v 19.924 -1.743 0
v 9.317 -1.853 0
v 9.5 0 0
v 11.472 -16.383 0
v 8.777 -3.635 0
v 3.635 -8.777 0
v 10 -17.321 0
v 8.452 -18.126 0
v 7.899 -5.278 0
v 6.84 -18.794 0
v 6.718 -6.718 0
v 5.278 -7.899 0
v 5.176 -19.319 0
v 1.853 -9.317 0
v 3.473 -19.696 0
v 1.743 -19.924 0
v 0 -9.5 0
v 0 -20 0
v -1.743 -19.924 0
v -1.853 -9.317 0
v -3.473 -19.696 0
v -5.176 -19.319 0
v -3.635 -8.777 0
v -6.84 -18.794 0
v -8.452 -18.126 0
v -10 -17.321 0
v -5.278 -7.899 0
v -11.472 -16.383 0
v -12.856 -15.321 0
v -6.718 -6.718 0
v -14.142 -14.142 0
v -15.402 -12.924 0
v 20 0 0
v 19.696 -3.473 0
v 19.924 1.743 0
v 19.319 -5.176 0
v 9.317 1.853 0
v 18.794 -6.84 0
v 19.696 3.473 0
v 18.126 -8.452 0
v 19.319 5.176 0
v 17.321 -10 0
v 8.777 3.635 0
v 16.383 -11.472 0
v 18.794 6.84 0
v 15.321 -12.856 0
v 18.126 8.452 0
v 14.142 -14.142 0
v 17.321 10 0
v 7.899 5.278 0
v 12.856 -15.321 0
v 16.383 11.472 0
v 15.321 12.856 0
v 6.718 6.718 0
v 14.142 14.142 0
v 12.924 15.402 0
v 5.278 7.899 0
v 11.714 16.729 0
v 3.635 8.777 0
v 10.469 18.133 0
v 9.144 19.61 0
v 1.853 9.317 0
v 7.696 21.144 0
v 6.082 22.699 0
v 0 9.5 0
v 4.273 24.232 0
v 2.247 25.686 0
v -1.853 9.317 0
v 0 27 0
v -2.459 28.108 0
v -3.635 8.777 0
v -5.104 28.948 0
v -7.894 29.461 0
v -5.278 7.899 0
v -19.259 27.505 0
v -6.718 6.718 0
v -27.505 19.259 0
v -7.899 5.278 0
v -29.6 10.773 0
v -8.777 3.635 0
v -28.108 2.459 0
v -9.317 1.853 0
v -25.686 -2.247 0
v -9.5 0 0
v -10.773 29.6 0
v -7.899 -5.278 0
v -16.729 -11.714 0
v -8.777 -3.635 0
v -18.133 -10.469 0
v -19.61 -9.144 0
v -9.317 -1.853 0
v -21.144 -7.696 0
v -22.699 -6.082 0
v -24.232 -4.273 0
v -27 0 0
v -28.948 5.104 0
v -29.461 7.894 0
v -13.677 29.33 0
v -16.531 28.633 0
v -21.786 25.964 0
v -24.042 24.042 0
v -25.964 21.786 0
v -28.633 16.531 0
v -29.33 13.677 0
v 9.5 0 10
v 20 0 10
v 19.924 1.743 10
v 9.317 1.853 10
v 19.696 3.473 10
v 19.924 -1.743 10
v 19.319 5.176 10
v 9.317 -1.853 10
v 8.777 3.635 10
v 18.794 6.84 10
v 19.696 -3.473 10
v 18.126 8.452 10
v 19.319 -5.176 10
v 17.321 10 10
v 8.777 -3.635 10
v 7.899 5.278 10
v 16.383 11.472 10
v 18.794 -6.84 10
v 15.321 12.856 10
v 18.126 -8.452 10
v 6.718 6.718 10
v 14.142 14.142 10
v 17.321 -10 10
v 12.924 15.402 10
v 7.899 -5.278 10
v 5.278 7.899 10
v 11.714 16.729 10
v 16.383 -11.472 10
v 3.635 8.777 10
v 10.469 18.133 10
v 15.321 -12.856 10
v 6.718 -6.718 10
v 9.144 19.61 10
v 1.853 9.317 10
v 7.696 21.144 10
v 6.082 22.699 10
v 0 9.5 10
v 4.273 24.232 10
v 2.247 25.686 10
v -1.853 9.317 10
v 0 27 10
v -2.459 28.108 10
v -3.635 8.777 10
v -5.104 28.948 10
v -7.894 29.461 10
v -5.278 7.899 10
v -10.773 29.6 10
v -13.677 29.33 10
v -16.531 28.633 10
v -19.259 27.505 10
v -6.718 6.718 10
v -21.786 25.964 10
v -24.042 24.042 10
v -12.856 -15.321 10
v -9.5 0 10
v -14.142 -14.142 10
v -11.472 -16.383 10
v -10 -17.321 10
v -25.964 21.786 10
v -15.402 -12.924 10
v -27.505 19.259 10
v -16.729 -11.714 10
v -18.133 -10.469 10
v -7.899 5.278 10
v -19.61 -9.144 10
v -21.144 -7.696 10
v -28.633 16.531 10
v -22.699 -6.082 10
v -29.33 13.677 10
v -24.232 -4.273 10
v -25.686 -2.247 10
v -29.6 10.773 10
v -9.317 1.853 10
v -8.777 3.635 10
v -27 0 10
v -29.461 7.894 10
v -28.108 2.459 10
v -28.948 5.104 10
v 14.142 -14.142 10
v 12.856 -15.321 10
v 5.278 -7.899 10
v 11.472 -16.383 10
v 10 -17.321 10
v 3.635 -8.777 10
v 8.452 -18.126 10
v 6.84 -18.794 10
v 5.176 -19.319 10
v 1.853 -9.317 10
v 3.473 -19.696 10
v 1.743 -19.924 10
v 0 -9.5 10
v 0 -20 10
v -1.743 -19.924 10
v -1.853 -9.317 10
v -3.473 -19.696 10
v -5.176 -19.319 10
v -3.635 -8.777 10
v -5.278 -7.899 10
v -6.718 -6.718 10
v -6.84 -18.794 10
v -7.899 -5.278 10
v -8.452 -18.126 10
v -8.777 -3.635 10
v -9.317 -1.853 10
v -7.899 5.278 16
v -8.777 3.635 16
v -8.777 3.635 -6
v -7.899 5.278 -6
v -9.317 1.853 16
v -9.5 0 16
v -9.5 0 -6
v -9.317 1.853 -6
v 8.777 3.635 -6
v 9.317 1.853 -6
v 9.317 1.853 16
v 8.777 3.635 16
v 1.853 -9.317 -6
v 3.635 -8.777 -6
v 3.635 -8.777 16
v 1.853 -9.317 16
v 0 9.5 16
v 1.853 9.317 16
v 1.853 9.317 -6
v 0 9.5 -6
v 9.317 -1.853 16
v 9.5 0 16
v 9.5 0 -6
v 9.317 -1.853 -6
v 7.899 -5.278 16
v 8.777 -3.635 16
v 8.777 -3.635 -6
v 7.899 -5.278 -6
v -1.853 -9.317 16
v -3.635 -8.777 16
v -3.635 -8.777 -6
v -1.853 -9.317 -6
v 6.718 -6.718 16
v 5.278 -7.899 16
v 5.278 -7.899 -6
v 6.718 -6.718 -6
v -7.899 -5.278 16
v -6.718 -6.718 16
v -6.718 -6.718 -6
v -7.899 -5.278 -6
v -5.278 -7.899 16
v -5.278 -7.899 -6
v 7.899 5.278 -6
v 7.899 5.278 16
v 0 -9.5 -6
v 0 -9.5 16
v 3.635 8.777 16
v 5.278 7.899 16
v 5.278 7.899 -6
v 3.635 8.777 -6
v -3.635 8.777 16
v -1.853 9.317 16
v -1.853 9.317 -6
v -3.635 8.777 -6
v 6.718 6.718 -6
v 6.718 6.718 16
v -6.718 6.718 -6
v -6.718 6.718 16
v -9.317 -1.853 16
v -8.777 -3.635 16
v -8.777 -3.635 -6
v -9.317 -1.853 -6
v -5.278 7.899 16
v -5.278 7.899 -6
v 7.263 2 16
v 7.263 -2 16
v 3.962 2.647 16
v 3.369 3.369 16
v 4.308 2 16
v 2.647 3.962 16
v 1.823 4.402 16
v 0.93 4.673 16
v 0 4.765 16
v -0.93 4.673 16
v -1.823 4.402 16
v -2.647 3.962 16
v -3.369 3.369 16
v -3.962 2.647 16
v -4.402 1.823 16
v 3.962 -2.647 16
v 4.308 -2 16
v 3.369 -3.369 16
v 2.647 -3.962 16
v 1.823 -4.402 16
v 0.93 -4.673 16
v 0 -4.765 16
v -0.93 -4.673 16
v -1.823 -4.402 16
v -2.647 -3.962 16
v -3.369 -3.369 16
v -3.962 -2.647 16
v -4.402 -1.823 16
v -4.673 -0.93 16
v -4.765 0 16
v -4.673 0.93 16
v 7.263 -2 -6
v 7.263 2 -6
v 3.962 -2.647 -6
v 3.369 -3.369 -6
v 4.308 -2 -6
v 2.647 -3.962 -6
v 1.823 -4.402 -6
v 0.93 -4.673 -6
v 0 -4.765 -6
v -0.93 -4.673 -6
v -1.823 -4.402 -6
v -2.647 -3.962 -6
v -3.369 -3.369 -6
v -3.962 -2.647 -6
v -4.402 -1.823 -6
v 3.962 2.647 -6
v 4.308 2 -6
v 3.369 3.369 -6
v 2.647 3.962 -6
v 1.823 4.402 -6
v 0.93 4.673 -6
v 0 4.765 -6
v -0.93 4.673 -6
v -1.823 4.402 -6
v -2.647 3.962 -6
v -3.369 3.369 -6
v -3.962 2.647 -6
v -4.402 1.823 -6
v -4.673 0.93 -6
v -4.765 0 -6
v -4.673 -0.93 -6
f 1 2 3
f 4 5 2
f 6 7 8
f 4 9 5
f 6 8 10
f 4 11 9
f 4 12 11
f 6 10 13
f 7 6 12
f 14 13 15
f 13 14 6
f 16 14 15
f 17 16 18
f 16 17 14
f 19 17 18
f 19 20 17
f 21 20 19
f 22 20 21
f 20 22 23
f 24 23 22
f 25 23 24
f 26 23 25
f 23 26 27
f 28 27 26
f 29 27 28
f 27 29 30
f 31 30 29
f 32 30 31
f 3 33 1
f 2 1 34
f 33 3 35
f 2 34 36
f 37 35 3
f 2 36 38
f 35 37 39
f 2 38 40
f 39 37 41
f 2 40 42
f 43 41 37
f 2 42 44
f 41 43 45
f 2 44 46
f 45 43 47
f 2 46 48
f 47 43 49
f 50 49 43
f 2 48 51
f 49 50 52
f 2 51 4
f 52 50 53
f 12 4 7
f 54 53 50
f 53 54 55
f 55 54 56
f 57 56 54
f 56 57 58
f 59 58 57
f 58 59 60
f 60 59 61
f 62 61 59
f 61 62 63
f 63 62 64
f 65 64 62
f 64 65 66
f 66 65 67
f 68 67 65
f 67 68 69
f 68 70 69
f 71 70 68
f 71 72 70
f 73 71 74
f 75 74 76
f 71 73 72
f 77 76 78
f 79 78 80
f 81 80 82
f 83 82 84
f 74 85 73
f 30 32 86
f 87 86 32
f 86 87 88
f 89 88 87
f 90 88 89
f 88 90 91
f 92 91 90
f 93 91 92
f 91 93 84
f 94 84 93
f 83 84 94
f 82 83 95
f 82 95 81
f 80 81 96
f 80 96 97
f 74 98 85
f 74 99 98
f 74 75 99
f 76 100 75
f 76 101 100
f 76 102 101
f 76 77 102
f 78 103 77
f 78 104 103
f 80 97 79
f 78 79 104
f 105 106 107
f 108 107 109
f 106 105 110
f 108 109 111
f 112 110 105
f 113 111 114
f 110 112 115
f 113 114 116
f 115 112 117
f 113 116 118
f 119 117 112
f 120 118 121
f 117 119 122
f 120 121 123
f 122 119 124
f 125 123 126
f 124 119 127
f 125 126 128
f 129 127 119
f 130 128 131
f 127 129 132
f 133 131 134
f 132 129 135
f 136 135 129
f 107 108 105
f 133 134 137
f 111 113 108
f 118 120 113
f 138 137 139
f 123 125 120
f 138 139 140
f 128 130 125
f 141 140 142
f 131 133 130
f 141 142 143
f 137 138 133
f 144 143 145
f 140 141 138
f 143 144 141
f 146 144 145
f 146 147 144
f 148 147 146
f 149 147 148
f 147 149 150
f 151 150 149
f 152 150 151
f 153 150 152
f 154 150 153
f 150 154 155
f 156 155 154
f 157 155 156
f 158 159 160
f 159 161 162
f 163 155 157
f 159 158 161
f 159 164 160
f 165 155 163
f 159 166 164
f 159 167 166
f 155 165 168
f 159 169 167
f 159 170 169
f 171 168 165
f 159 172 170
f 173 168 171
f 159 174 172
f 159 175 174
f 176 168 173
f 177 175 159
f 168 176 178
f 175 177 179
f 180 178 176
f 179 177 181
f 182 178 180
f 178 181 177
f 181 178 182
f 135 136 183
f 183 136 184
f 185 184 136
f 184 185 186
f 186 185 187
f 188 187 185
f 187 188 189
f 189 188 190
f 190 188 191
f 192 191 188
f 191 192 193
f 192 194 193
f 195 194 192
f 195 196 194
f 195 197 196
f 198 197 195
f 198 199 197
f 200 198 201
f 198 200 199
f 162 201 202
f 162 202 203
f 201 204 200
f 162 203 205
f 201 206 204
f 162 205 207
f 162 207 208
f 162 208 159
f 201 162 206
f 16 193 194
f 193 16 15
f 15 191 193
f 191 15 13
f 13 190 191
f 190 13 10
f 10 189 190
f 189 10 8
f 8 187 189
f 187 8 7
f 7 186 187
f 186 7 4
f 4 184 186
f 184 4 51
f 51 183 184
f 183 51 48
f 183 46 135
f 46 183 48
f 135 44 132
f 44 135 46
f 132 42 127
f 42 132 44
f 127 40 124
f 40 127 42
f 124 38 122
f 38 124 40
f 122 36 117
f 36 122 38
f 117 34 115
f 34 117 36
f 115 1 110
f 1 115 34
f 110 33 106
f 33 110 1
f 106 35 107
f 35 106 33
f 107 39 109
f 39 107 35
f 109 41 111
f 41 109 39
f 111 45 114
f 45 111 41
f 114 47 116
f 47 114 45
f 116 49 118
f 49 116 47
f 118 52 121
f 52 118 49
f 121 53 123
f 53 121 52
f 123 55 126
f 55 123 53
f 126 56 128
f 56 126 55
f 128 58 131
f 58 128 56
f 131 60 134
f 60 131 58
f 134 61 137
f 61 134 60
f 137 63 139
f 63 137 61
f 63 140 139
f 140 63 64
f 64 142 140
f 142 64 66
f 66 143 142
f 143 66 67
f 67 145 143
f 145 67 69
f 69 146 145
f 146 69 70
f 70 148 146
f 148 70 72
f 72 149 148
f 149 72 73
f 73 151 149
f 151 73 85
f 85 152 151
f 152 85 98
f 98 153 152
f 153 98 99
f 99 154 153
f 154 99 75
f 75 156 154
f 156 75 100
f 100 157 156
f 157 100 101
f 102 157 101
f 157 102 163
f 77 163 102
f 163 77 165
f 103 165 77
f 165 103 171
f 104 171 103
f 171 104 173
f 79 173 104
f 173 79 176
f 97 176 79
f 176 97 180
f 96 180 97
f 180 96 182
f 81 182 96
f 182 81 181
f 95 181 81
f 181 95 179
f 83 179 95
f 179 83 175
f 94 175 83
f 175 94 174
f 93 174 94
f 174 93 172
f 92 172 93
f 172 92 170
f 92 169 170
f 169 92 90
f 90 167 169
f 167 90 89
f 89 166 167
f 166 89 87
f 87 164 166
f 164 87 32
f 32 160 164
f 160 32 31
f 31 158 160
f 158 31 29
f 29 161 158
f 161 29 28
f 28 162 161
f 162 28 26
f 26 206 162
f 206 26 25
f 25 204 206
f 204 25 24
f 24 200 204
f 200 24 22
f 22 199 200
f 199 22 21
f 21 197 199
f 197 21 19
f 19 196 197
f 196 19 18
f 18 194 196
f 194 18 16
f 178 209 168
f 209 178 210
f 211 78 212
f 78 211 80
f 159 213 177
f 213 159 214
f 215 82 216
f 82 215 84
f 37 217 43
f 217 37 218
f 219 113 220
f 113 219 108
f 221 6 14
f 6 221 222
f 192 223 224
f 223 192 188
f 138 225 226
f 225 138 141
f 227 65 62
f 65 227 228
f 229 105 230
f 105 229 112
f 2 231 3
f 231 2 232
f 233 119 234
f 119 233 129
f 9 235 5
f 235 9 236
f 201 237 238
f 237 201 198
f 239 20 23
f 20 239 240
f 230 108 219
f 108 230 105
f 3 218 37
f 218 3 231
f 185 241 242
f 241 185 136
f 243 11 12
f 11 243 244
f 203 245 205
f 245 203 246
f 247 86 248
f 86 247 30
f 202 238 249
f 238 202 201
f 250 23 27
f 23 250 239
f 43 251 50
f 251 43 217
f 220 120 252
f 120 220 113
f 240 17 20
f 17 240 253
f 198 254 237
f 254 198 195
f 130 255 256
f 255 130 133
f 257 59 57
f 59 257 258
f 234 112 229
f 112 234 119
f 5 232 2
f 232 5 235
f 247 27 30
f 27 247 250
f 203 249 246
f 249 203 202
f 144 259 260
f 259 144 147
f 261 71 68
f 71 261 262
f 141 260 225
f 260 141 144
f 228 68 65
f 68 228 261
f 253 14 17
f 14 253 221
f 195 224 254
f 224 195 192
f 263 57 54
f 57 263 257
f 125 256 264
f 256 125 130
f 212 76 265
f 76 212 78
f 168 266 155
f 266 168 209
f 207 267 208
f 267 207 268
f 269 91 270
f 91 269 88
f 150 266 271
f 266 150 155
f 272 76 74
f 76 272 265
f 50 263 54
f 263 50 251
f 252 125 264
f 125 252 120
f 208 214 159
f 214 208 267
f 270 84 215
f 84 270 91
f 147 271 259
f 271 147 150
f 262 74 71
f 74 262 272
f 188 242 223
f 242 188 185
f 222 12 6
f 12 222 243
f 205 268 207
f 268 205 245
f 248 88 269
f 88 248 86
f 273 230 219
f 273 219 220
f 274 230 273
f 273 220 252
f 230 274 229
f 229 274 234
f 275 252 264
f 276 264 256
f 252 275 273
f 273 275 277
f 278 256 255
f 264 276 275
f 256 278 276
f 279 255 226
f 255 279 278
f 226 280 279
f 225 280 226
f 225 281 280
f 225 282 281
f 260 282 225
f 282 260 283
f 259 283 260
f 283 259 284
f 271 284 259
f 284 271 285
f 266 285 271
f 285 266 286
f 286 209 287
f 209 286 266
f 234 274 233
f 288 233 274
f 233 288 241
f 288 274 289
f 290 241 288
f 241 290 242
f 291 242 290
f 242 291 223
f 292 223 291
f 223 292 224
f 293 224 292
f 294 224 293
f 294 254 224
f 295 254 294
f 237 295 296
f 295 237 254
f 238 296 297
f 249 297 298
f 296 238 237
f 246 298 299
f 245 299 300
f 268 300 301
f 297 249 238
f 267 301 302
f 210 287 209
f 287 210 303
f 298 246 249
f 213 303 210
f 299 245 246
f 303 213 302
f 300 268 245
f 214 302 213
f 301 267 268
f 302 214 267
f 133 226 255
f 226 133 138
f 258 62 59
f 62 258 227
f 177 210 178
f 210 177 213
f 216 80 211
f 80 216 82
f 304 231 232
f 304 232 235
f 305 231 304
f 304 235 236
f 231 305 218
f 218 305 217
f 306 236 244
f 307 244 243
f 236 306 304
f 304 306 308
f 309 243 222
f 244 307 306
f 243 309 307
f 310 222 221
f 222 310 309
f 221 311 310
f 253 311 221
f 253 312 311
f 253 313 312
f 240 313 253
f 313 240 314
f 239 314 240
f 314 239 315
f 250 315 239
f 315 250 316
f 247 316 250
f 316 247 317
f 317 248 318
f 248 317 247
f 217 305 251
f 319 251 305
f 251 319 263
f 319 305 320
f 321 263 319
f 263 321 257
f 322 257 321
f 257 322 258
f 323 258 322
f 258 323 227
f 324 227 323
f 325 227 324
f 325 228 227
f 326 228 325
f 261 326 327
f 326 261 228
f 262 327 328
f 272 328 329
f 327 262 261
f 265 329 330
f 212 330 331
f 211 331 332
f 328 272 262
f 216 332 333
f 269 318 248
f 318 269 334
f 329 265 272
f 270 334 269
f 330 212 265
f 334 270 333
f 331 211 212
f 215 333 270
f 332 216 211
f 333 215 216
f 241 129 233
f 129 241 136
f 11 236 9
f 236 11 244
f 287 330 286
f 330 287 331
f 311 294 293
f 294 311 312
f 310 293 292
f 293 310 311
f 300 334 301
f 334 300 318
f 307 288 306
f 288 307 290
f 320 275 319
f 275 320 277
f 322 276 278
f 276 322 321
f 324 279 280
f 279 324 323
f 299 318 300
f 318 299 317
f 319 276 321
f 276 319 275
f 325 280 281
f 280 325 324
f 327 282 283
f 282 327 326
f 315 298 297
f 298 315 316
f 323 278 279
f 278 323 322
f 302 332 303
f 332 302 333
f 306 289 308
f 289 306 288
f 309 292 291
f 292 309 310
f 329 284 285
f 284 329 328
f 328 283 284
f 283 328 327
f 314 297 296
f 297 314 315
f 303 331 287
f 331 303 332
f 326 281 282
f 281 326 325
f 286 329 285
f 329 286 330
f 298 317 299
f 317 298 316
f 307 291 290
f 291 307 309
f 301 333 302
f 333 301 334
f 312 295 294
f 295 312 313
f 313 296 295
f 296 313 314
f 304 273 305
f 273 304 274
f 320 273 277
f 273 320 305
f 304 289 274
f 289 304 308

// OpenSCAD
$fn = 32;

// ----------------------------------------------------------------------
// Cam: base radius 20 mm with a 14 mm lift over 180 degrees
// ----------------------------------------------------------------------

// --- parameters (mm) ---
base_r = 20;              // base radius
lift = 14;                // lift height above the base radius
lift_span = 180;          // angular width of the lift
lift_start = 45;          // angle where the lift starts
cam_t = 10;               // cam plate thickness
hub_d = 19;               // hub diameter
hub_h = 22;               // hub height
bore_d = 9.53;            // bore
key_w = 4;                // keyway width
key_depth = 2;            // keyway depth

cam_profile = [[20, 0], [19.924, 1.743], [19.696, 3.473], [19.319, 5.176], [18.794, 6.84], [18.126, 8.452], [17.321, 10], [16.383, 11.472], [15.321, 12.856], [14.142, 14.142], [12.924, 15.402], [11.714, 16.729], [10.469, 18.133], [9.144, 19.61], [7.696, 21.144], [6.082, 22.699], [4.273, 24.232], [2.247, 25.686], [0, 27], [-2.459, 28.108], [-5.104, 28.948], [-7.894, 29.461], [-10.773, 29.6], [-13.677, 29.33], [-16.531, 28.633], [-19.259, 27.505], [-21.786, 25.964], [-24.042, 24.042], [-25.964, 21.786], [-27.505, 19.259], [-28.633, 16.531], [-29.33, 13.677], [-29.6, 10.773], [-29.461, 7.894], [-28.948, 5.104], [-28.108, 2.459], [-27, 0], [-25.686, -2.247], [-24.232, -4.273], [-22.699, -6.082], [-21.144, -7.696], [-19.61, -9.144], [-18.133, -10.469], [-16.729, -11.714], [-15.402, -12.924], [-14.142, -14.142], [-12.856, -15.321], [-11.472, -16.383], [-10, -17.321], [-8.452, -18.126], [-6.84, -18.794], [-5.176, -19.319], [-3.473, -19.696], [-1.743, -19.924], [0, -20], [1.743, -19.924], [3.473, -19.696], [5.176, -19.319], [6.84, -18.794], [8.452, -18.126], [10, -17.321], [11.472, -16.383], [12.856, -15.321], [14.142, -14.142], [15.321, -12.856], [16.383, -11.472], [17.321, -10], [18.126, -8.452], [18.794, -6.84], [19.319, -5.176], [19.696, -3.473], [19.924, -1.743]];

difference() {
  union() {
    linear_extrude(height = cam_t) polygon(cam_profile);
    /* hub, proud of the cam plate on both sides */
    translate([0, 0, -6]) cylinder(h = hub_h, d = hub_d);
  }
  /* bore through the hub, 2.5 mm clear on both faces */
  translate([0, 0, -8.5]) cylinder(h = hub_h + 5, d = bore_d);
  /* keyway, milled through the whole hub */
  translate([2.763, -2, -8.5]) cube([4.5, 4, 27]);
}
